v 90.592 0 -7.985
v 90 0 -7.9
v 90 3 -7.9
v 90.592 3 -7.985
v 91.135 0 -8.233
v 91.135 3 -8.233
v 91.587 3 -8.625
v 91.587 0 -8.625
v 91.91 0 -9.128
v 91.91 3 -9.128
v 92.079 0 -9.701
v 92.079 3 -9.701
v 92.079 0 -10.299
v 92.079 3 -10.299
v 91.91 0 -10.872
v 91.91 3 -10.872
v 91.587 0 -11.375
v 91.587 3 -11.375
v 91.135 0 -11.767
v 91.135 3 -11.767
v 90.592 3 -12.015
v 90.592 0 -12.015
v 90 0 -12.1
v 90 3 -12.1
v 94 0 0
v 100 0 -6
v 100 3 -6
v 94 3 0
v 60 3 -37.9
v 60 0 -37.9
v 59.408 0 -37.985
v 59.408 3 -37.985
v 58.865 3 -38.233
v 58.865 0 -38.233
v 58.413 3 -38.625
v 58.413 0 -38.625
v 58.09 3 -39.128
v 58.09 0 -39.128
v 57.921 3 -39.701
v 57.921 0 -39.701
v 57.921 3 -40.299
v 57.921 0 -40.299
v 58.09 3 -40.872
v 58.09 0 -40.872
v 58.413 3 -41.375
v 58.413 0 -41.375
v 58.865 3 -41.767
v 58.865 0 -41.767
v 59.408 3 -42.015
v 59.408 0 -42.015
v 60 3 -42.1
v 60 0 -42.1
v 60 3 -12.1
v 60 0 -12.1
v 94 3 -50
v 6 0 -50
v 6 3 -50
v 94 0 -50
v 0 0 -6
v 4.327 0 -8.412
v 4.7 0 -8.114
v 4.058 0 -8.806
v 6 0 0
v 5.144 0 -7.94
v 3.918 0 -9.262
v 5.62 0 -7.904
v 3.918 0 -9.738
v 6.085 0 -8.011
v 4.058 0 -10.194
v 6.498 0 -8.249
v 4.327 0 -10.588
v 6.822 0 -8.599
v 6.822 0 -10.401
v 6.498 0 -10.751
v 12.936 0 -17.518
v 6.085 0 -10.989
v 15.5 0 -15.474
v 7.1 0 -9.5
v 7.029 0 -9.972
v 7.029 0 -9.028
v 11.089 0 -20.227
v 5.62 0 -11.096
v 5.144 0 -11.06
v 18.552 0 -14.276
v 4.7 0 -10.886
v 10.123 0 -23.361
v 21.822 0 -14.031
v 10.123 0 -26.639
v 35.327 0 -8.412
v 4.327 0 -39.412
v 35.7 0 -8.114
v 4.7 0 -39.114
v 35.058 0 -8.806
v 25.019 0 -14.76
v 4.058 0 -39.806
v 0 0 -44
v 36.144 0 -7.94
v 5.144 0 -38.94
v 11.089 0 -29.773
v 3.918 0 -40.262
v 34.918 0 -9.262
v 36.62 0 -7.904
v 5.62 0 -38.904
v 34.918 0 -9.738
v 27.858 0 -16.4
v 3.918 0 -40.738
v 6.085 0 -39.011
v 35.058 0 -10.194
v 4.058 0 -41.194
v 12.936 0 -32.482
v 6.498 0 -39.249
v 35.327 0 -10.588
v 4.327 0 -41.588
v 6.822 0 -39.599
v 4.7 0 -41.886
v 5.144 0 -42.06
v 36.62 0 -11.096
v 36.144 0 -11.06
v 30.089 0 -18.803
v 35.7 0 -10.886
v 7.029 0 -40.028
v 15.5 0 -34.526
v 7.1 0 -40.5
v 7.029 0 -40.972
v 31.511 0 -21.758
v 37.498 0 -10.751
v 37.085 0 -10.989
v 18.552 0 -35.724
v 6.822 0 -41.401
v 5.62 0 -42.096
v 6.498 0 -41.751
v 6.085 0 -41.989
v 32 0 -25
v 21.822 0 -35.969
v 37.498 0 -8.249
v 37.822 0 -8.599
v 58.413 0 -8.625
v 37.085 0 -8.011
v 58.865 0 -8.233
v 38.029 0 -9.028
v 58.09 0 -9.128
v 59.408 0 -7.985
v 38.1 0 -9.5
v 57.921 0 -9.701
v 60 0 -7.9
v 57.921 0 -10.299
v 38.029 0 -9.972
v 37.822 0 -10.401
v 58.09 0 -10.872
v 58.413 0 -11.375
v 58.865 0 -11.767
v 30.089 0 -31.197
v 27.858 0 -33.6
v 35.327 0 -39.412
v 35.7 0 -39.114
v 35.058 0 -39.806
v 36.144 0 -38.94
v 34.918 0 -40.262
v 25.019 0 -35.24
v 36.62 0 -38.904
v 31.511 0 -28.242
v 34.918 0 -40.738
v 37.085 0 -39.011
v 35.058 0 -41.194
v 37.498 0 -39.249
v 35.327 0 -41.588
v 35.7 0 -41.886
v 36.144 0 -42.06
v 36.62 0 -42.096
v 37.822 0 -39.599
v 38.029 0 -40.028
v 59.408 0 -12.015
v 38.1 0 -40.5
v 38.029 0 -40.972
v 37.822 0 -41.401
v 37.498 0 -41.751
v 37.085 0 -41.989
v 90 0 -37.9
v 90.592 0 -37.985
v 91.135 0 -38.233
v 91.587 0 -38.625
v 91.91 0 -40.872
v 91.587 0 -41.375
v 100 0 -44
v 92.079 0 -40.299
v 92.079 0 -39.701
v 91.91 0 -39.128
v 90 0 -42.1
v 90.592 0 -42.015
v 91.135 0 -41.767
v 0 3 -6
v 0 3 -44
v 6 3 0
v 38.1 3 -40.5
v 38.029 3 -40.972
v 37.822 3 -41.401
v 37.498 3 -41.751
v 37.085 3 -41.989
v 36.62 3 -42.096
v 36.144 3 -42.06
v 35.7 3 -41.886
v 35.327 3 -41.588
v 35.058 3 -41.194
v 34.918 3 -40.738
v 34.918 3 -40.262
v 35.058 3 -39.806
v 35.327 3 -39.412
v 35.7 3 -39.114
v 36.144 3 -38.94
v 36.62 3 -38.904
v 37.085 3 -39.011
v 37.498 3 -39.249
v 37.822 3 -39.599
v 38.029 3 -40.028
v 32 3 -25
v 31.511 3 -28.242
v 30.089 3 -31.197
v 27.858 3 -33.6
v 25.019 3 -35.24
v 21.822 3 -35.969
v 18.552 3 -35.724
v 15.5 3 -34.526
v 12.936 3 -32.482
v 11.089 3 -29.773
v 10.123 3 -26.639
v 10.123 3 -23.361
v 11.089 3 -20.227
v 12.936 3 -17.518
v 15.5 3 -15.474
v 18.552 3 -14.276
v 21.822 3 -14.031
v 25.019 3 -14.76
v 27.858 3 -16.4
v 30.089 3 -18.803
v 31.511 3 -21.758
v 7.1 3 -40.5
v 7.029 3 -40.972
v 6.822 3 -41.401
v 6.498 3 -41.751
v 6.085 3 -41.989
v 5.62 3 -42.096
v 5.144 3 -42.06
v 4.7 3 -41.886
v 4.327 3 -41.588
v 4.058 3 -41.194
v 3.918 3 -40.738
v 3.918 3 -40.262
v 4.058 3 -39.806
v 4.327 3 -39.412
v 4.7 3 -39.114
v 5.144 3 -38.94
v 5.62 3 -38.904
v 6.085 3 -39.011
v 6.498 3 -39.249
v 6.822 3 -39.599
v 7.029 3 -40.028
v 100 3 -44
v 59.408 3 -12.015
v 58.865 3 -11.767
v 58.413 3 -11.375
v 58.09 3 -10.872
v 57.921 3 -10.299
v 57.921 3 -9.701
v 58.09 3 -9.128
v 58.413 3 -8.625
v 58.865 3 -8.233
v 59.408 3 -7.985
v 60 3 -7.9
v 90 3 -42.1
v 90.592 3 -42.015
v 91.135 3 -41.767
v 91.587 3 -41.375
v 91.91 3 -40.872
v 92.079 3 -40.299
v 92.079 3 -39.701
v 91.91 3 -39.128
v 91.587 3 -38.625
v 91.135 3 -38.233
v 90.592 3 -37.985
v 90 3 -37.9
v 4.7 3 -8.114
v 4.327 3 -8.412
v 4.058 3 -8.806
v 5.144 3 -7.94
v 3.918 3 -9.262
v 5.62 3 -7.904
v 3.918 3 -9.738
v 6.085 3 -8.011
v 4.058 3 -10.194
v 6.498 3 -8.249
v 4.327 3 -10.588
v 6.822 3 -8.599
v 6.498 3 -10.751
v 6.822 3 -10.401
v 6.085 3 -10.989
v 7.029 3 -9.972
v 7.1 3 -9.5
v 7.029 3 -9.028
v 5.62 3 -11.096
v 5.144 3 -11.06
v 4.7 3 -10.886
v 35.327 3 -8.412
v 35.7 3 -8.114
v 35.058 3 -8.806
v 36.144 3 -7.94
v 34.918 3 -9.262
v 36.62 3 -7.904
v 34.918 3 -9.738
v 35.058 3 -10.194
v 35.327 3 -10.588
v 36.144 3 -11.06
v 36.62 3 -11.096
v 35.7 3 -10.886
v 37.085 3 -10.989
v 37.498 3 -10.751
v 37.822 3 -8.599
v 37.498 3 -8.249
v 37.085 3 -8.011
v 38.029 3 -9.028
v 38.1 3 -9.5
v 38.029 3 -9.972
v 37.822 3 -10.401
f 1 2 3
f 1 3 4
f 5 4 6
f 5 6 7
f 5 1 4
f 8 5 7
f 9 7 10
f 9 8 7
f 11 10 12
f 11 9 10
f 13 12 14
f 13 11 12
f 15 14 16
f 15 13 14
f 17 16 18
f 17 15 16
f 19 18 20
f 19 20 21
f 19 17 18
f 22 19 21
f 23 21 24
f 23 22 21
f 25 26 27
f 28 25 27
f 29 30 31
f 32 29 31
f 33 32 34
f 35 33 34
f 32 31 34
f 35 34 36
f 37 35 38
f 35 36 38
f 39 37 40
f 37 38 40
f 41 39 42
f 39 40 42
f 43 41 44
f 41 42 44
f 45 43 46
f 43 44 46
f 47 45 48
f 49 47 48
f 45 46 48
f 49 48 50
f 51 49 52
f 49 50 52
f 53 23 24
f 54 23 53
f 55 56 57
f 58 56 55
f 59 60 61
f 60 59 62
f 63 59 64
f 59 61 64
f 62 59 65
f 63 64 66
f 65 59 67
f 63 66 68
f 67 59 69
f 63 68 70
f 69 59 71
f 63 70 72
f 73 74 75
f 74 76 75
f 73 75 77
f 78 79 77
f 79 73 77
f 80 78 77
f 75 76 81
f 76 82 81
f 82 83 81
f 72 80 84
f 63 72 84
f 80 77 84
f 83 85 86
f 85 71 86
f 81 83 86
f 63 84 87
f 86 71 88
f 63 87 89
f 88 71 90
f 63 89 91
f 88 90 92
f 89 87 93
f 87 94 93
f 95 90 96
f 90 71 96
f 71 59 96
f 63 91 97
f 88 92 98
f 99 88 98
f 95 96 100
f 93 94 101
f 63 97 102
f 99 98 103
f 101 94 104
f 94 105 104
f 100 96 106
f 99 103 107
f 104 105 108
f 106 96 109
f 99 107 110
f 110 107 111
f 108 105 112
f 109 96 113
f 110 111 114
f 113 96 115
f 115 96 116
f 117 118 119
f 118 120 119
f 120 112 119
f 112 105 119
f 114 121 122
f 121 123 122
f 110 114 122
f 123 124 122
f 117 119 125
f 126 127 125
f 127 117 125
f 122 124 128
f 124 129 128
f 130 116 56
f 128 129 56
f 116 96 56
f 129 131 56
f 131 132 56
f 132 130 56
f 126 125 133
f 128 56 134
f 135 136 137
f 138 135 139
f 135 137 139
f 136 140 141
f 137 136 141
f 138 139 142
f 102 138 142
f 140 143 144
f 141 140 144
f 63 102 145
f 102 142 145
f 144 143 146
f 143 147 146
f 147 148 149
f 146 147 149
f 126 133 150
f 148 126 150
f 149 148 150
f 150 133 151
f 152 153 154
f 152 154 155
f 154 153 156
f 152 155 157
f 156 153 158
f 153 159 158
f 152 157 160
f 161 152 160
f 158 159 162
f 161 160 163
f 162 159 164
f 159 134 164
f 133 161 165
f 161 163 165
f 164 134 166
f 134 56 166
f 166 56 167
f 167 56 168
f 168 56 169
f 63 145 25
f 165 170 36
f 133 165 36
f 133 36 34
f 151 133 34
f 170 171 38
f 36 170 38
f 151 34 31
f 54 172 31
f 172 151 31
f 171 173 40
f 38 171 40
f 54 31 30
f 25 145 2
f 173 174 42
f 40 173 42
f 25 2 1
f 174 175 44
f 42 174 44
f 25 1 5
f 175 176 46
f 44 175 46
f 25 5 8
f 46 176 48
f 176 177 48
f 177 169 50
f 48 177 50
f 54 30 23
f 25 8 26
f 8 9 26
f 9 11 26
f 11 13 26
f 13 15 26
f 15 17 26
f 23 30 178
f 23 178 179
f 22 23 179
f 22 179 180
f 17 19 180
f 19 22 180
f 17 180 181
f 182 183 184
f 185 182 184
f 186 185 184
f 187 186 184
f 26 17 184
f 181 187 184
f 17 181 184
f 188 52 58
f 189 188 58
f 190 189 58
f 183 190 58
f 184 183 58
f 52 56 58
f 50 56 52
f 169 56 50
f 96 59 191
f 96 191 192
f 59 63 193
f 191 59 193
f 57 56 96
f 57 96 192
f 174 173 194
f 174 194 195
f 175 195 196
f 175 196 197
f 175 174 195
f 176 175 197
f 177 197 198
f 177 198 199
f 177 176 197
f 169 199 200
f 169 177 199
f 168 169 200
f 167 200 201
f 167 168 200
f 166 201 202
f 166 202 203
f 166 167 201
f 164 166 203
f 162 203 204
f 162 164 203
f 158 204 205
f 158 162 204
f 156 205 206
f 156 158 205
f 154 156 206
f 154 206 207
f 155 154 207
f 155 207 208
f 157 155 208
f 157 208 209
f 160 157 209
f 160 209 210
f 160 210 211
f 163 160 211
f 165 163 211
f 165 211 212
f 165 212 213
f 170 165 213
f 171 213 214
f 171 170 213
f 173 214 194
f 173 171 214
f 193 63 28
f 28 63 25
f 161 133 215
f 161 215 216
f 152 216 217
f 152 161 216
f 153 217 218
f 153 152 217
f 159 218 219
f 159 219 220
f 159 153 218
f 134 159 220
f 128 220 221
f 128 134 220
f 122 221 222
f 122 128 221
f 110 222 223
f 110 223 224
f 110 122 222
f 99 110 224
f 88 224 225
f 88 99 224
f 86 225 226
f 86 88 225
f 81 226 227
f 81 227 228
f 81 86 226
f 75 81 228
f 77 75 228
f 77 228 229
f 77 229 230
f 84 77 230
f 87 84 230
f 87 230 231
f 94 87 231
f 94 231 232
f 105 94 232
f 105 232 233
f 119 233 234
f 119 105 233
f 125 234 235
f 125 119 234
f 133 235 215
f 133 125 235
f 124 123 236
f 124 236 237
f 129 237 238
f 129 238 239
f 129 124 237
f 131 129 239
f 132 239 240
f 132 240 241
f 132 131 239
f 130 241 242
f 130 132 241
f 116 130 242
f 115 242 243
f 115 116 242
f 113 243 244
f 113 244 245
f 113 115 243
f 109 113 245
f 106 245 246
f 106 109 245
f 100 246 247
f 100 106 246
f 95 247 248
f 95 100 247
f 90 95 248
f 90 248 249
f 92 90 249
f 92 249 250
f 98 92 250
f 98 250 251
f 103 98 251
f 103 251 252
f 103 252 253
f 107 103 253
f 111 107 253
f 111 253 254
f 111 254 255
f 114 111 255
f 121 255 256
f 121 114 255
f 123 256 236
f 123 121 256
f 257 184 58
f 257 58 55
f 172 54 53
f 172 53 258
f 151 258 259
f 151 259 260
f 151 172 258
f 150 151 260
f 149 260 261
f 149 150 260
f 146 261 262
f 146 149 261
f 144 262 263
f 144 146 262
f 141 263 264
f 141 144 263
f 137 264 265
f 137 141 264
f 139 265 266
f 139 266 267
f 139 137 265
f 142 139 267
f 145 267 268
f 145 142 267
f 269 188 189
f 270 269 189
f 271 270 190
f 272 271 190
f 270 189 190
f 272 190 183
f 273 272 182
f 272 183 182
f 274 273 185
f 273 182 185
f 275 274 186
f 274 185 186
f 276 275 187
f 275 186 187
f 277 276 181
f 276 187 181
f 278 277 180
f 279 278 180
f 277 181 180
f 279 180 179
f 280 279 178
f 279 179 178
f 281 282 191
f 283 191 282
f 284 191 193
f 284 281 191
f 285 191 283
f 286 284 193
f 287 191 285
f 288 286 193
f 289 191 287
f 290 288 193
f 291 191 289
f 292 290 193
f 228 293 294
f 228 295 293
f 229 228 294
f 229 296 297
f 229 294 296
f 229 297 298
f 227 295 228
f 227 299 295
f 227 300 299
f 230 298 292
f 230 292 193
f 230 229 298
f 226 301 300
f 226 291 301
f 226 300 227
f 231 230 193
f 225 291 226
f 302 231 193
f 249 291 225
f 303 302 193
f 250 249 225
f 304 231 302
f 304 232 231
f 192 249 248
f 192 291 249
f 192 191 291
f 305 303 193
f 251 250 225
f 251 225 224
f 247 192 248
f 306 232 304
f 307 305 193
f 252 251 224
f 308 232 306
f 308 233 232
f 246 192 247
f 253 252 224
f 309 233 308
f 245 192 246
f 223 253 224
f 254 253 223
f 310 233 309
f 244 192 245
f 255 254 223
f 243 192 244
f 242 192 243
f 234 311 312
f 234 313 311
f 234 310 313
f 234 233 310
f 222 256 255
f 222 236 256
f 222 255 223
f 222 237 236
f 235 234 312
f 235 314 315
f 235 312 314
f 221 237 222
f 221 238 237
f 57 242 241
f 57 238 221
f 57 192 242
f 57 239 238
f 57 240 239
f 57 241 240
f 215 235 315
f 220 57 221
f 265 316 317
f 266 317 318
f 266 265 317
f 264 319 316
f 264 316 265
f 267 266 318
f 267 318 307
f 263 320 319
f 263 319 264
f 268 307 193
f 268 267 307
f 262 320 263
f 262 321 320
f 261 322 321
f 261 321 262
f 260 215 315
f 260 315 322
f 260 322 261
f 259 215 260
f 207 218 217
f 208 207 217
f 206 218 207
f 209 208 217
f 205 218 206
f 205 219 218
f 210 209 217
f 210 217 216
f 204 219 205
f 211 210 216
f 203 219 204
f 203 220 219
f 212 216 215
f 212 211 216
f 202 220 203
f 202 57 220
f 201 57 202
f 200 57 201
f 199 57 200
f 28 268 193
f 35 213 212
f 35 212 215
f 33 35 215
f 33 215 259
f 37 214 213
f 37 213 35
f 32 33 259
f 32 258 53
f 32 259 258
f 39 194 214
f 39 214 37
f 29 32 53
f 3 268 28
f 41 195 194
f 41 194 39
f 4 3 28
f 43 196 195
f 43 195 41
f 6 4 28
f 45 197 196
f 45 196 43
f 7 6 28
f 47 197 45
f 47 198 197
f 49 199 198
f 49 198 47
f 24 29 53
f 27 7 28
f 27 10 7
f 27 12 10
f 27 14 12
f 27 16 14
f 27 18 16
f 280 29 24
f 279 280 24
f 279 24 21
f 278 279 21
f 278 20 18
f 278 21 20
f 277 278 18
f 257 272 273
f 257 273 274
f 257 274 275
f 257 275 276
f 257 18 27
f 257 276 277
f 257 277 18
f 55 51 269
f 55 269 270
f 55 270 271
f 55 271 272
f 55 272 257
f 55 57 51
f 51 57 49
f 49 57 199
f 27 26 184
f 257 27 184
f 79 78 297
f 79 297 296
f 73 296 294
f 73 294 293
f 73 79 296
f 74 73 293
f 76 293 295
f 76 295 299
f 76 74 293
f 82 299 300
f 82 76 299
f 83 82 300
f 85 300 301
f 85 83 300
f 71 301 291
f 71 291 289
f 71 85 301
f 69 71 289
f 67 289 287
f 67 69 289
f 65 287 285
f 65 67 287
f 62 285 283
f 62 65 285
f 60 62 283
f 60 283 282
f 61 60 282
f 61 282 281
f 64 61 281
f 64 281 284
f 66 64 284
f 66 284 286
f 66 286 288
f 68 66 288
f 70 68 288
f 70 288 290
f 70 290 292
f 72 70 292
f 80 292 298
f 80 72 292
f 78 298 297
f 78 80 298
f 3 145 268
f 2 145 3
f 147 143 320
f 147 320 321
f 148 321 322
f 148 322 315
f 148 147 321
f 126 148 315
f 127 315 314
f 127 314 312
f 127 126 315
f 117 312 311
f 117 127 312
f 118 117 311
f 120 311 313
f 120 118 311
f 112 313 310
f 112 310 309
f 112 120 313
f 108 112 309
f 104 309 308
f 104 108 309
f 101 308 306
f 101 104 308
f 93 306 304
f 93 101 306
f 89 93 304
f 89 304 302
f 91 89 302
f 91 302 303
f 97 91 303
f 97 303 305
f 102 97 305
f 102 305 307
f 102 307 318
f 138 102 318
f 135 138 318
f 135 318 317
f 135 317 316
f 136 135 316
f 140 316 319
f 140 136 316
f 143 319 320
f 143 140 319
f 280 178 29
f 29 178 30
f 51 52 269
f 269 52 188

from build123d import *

# Parameters (mm, degrees)
SKETCH_1_W      = 100
SKETCH_1_H      = 50
SKETCH_1_R      = 11
SKETCH_1_R_2    = 1.6
EXTRUDE_1_DEPTH = 3
CHAMFER_1_SIZE  = 6


with BuildPart() as part:
    # 草图1 → 凸台-拉伸1 (new body)
    with BuildSketch(Plane(origin=(0, 0, 0), x_dir=(1, 0, 0), z_dir=(0, 1, 0))):
        with Locations((50, 25)):
            Rectangle(SKETCH_1_W, SKETCH_1_H)
        with Locations((21, 25)):
            Circle(SKETCH_1_R, mode=Mode.SUBTRACT)
        with Locations((5.5, 40.5)):
            Circle(SKETCH_1_R_2, mode=Mode.SUBTRACT)
        with Locations((36.5, 40.5)):
            Circle(SKETCH_1_R_2, mode=Mode.SUBTRACT)
        with Locations((36.5, 9.5)):
            Circle(SKETCH_1_R_2, mode=Mode.SUBTRACT)
        with Locations((5.5, 9.5)):
            Circle(SKETCH_1_R_2, mode=Mode.SUBTRACT)
        with BuildLine():
            Line((60, 42.1), (90, 42.1))
            ThreePointArc((90, 42.1), (92.1, 40), (90, 37.9))
            Line((90, 37.9), (60, 37.9))
            ThreePointArc((60, 37.9), (57.9, 40), (60, 42.1))
        make_face(mode=Mode.SUBTRACT)
        with BuildLine():
            Line((60, 7.9), (90, 7.9))
            ThreePointArc((90, 7.9), (92.1, 10), (90, 12.1))
            Line((90, 12.1), (60, 12.1))
            ThreePointArc((60, 12.1), (57.9, 10), (60, 7.9))
        make_face(mode=Mode.SUBTRACT)
    extrude(amount=EXTRUDE_1_DEPTH)

    # 倒角1
    chamfer_1_edges = [part.edges().sort_by_distance(p)[0] for p in [
        (0, 1.5, -50),
        (100, 1.5, -50),
        (100, 1.5, 0),
        (0, 1.5, 0),
    ]]
    chamfer(chamfer_1_edges, length=CHAMFER_1_SIZE)


solid = part.part
